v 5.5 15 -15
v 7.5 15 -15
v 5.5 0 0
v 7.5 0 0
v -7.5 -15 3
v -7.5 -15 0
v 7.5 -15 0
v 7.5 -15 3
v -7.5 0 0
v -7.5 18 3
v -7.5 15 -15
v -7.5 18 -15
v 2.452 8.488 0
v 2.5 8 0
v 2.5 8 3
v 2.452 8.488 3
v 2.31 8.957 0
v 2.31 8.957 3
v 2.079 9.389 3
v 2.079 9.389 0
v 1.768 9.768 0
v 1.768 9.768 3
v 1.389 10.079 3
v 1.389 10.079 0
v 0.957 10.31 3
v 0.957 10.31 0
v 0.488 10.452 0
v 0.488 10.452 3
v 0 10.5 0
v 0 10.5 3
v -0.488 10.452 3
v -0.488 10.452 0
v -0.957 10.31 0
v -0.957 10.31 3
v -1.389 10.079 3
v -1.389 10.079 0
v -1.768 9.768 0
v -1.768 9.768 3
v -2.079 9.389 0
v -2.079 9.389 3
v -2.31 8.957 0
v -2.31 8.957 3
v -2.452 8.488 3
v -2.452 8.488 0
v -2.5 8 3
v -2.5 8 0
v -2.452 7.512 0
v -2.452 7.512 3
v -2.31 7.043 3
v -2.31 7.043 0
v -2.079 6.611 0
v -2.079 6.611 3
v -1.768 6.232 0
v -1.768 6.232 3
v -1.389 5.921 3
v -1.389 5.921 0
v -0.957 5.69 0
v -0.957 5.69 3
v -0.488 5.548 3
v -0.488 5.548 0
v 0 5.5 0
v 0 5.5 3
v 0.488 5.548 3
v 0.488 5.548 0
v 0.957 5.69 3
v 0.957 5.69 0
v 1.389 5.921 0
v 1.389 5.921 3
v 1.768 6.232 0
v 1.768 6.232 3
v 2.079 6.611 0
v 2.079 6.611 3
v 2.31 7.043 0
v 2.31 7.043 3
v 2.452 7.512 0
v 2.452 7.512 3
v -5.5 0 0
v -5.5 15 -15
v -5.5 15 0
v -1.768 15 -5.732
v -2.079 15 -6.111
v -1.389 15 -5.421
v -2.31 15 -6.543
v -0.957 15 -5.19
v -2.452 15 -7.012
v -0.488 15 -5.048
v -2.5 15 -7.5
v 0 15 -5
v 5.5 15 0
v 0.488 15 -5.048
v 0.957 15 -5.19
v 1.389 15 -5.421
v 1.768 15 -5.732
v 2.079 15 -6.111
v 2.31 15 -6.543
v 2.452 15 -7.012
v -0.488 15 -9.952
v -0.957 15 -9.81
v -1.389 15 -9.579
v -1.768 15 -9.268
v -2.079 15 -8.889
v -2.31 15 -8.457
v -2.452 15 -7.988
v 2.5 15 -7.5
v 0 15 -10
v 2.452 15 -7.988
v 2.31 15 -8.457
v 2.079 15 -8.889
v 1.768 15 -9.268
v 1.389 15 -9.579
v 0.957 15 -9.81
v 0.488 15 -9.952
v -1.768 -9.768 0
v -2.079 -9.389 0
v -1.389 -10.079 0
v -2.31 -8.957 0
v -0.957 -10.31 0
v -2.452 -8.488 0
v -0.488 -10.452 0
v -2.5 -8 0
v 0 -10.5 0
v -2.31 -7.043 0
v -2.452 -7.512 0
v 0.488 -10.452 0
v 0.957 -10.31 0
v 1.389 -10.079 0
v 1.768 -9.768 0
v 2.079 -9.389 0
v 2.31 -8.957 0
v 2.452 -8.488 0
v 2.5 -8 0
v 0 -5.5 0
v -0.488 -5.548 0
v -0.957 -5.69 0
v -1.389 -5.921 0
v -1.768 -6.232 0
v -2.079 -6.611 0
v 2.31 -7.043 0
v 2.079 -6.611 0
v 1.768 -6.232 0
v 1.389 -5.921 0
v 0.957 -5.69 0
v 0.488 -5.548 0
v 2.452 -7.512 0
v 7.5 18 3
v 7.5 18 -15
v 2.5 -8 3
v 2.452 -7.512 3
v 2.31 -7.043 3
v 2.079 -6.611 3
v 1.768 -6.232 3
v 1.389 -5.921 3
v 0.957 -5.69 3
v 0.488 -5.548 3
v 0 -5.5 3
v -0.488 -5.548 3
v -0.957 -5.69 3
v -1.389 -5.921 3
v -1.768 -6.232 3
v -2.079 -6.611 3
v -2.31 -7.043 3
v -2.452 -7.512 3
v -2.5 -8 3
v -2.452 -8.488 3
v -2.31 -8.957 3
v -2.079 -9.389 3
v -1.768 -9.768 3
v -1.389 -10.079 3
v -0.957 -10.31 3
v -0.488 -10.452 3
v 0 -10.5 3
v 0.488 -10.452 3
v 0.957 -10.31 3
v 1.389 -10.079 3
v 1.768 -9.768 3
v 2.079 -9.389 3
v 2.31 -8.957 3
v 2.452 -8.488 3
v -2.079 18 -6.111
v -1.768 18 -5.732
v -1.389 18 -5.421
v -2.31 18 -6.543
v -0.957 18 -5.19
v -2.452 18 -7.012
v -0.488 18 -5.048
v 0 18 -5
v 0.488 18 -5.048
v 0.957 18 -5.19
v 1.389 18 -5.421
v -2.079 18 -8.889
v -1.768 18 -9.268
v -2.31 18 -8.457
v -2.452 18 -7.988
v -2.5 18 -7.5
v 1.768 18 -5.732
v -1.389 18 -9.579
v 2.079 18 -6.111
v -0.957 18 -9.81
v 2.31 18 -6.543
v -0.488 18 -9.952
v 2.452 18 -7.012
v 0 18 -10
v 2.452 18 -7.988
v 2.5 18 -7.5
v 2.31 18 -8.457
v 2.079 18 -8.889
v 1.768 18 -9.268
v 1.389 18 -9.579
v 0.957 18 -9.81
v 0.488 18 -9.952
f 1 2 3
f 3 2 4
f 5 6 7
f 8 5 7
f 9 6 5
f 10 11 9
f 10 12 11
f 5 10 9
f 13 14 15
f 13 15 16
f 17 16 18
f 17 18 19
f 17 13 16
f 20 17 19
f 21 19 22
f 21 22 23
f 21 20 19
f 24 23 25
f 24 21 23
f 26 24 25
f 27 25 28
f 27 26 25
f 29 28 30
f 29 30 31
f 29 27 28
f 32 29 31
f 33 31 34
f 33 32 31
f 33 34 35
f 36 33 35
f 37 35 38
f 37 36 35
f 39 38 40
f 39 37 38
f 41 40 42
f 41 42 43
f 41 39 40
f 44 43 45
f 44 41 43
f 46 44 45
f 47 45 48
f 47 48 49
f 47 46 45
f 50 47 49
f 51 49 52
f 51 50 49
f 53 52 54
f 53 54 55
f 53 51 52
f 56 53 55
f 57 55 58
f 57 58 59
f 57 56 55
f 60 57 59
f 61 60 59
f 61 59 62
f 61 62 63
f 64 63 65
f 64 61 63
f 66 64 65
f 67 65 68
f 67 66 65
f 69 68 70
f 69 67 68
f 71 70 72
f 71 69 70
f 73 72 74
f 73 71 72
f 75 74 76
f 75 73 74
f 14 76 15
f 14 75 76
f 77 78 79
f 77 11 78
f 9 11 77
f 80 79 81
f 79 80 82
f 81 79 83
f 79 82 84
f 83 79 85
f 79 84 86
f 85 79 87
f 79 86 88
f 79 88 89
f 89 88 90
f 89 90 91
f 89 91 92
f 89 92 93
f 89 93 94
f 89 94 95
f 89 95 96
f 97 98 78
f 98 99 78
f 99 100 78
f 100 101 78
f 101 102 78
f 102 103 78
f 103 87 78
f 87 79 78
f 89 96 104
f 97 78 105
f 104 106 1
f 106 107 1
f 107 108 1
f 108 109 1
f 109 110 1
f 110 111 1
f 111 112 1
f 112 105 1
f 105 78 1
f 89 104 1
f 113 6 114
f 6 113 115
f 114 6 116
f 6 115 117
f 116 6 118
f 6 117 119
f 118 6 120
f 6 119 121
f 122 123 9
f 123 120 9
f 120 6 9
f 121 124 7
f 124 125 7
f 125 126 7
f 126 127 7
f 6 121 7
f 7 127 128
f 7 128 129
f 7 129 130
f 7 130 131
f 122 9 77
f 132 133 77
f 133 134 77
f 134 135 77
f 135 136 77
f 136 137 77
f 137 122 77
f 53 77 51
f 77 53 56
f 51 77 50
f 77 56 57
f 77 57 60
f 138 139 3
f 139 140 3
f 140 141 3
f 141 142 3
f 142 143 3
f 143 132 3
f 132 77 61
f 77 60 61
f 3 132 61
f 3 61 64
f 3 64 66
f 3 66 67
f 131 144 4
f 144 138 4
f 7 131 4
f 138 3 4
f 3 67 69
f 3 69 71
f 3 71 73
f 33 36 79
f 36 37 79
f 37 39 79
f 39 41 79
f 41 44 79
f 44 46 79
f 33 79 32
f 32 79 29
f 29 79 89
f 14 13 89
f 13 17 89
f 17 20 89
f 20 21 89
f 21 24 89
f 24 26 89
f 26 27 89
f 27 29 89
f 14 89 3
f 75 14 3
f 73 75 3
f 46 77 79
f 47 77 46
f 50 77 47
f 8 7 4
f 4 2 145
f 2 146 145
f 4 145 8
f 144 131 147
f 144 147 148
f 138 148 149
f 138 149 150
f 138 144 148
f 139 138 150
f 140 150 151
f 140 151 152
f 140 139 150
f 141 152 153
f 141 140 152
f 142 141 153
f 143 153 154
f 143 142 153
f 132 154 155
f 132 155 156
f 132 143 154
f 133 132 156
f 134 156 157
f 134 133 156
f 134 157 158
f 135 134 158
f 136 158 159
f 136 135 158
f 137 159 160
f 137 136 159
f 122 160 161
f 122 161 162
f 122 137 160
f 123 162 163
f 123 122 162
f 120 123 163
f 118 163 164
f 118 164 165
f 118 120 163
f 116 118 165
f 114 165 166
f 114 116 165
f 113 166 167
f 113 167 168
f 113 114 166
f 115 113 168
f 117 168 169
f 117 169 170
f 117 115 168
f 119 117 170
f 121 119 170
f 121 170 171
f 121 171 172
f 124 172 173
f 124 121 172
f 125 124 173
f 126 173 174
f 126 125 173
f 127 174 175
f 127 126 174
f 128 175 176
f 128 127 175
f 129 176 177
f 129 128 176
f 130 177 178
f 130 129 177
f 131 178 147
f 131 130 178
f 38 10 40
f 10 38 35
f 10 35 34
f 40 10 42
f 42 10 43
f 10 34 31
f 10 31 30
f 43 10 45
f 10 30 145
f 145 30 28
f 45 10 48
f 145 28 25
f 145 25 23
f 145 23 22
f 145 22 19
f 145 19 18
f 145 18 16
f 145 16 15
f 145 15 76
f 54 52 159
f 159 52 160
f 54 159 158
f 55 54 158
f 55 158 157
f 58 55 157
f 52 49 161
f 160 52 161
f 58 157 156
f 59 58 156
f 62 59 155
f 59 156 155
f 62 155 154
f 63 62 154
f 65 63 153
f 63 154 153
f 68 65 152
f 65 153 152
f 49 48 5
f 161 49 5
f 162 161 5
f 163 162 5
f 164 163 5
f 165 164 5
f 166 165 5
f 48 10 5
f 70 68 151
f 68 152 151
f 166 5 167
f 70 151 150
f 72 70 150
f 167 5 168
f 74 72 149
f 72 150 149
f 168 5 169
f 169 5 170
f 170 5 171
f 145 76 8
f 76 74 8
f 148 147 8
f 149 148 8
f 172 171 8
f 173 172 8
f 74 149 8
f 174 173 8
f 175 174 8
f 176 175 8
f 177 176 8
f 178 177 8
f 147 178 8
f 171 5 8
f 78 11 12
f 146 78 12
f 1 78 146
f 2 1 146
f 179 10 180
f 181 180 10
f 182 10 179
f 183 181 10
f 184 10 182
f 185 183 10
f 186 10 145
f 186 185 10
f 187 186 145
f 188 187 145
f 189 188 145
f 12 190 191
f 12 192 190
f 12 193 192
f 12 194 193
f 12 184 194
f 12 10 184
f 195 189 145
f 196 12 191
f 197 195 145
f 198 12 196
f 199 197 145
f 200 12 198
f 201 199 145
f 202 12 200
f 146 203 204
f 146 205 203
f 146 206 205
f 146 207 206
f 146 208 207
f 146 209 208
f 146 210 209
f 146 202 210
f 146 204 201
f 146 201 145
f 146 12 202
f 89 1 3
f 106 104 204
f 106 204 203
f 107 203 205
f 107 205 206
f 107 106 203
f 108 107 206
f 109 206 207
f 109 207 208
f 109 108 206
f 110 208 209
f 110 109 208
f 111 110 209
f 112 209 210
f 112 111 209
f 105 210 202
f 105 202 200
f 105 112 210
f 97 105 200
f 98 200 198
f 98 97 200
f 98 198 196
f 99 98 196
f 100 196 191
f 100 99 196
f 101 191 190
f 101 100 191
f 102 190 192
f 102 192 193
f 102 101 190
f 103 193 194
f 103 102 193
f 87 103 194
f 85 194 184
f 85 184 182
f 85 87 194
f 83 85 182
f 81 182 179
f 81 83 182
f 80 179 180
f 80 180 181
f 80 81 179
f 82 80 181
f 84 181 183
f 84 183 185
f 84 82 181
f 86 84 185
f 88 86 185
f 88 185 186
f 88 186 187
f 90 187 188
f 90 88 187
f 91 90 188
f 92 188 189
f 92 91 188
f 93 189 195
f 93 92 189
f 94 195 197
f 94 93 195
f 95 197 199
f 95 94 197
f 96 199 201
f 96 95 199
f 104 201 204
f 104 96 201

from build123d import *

# Parameters (mm, degrees)
SKETCH1_W           = 15
SKETCH1_H           = 30
SKETCH1_R           = 2.5
BOSS_EXTRUDE1_DEPTH = 3
SKETCH2_W           = 15
SKETCH2_H           = 18
SKETCH2_R           = 2.5
BOSS_EXTRUDE2_DEPTH = 3
BOSS_EXTRUDE3_DEPTH = 2


with BuildPart() as part:
    # Sketch1 → Boss-Extrude1 (new body)
    with BuildSketch(Plane.XY):
        Rectangle(SKETCH1_W, SKETCH1_H)
        with Locations((0, 8)):
            Circle(SKETCH1_R, mode=Mode.SUBTRACT)
        with Locations((0, -8)):
            Circle(SKETCH1_R, mode=Mode.SUBTRACT)
    extrude(amount=BOSS_EXTRUDE1_DEPTH)

    # Sketch2 → Boss-Extrude2 (add)
    with BuildSketch(Plane(origin=(0, 15, 0), x_dir=(1, 0, 0), z_dir=(0, 1, 0))):
        with Locations((0, 6)):
            Rectangle(SKETCH2_W, SKETCH2_H)
        with Locations((0, 7.5)):
            Circle(SKETCH2_R, mode=Mode.SUBTRACT)
    extrude(amount=BOSS_EXTRUDE2_DEPTH)

    # Sketch3 → Boss-Extrude3 (add)
    with BuildSketch(Plane(origin=(7.5, 0, 0), x_dir=(0, 0, -1), z_dir=(1, 0, 0))):
        Polygon((15, 15), (0, 0), (0, 15), align=None)
    boss_extrude3 = extrude(amount=-BOSS_EXTRUDE3_DEPTH)

    # Mirror1: Boss-Extrude3 across plane
    add(boss_extrude3.mirror(Plane(origin=(0, 0, 0), x_dir=(0, 0, 1), z_dir=(1, 0, 0))))


solid = part.part
